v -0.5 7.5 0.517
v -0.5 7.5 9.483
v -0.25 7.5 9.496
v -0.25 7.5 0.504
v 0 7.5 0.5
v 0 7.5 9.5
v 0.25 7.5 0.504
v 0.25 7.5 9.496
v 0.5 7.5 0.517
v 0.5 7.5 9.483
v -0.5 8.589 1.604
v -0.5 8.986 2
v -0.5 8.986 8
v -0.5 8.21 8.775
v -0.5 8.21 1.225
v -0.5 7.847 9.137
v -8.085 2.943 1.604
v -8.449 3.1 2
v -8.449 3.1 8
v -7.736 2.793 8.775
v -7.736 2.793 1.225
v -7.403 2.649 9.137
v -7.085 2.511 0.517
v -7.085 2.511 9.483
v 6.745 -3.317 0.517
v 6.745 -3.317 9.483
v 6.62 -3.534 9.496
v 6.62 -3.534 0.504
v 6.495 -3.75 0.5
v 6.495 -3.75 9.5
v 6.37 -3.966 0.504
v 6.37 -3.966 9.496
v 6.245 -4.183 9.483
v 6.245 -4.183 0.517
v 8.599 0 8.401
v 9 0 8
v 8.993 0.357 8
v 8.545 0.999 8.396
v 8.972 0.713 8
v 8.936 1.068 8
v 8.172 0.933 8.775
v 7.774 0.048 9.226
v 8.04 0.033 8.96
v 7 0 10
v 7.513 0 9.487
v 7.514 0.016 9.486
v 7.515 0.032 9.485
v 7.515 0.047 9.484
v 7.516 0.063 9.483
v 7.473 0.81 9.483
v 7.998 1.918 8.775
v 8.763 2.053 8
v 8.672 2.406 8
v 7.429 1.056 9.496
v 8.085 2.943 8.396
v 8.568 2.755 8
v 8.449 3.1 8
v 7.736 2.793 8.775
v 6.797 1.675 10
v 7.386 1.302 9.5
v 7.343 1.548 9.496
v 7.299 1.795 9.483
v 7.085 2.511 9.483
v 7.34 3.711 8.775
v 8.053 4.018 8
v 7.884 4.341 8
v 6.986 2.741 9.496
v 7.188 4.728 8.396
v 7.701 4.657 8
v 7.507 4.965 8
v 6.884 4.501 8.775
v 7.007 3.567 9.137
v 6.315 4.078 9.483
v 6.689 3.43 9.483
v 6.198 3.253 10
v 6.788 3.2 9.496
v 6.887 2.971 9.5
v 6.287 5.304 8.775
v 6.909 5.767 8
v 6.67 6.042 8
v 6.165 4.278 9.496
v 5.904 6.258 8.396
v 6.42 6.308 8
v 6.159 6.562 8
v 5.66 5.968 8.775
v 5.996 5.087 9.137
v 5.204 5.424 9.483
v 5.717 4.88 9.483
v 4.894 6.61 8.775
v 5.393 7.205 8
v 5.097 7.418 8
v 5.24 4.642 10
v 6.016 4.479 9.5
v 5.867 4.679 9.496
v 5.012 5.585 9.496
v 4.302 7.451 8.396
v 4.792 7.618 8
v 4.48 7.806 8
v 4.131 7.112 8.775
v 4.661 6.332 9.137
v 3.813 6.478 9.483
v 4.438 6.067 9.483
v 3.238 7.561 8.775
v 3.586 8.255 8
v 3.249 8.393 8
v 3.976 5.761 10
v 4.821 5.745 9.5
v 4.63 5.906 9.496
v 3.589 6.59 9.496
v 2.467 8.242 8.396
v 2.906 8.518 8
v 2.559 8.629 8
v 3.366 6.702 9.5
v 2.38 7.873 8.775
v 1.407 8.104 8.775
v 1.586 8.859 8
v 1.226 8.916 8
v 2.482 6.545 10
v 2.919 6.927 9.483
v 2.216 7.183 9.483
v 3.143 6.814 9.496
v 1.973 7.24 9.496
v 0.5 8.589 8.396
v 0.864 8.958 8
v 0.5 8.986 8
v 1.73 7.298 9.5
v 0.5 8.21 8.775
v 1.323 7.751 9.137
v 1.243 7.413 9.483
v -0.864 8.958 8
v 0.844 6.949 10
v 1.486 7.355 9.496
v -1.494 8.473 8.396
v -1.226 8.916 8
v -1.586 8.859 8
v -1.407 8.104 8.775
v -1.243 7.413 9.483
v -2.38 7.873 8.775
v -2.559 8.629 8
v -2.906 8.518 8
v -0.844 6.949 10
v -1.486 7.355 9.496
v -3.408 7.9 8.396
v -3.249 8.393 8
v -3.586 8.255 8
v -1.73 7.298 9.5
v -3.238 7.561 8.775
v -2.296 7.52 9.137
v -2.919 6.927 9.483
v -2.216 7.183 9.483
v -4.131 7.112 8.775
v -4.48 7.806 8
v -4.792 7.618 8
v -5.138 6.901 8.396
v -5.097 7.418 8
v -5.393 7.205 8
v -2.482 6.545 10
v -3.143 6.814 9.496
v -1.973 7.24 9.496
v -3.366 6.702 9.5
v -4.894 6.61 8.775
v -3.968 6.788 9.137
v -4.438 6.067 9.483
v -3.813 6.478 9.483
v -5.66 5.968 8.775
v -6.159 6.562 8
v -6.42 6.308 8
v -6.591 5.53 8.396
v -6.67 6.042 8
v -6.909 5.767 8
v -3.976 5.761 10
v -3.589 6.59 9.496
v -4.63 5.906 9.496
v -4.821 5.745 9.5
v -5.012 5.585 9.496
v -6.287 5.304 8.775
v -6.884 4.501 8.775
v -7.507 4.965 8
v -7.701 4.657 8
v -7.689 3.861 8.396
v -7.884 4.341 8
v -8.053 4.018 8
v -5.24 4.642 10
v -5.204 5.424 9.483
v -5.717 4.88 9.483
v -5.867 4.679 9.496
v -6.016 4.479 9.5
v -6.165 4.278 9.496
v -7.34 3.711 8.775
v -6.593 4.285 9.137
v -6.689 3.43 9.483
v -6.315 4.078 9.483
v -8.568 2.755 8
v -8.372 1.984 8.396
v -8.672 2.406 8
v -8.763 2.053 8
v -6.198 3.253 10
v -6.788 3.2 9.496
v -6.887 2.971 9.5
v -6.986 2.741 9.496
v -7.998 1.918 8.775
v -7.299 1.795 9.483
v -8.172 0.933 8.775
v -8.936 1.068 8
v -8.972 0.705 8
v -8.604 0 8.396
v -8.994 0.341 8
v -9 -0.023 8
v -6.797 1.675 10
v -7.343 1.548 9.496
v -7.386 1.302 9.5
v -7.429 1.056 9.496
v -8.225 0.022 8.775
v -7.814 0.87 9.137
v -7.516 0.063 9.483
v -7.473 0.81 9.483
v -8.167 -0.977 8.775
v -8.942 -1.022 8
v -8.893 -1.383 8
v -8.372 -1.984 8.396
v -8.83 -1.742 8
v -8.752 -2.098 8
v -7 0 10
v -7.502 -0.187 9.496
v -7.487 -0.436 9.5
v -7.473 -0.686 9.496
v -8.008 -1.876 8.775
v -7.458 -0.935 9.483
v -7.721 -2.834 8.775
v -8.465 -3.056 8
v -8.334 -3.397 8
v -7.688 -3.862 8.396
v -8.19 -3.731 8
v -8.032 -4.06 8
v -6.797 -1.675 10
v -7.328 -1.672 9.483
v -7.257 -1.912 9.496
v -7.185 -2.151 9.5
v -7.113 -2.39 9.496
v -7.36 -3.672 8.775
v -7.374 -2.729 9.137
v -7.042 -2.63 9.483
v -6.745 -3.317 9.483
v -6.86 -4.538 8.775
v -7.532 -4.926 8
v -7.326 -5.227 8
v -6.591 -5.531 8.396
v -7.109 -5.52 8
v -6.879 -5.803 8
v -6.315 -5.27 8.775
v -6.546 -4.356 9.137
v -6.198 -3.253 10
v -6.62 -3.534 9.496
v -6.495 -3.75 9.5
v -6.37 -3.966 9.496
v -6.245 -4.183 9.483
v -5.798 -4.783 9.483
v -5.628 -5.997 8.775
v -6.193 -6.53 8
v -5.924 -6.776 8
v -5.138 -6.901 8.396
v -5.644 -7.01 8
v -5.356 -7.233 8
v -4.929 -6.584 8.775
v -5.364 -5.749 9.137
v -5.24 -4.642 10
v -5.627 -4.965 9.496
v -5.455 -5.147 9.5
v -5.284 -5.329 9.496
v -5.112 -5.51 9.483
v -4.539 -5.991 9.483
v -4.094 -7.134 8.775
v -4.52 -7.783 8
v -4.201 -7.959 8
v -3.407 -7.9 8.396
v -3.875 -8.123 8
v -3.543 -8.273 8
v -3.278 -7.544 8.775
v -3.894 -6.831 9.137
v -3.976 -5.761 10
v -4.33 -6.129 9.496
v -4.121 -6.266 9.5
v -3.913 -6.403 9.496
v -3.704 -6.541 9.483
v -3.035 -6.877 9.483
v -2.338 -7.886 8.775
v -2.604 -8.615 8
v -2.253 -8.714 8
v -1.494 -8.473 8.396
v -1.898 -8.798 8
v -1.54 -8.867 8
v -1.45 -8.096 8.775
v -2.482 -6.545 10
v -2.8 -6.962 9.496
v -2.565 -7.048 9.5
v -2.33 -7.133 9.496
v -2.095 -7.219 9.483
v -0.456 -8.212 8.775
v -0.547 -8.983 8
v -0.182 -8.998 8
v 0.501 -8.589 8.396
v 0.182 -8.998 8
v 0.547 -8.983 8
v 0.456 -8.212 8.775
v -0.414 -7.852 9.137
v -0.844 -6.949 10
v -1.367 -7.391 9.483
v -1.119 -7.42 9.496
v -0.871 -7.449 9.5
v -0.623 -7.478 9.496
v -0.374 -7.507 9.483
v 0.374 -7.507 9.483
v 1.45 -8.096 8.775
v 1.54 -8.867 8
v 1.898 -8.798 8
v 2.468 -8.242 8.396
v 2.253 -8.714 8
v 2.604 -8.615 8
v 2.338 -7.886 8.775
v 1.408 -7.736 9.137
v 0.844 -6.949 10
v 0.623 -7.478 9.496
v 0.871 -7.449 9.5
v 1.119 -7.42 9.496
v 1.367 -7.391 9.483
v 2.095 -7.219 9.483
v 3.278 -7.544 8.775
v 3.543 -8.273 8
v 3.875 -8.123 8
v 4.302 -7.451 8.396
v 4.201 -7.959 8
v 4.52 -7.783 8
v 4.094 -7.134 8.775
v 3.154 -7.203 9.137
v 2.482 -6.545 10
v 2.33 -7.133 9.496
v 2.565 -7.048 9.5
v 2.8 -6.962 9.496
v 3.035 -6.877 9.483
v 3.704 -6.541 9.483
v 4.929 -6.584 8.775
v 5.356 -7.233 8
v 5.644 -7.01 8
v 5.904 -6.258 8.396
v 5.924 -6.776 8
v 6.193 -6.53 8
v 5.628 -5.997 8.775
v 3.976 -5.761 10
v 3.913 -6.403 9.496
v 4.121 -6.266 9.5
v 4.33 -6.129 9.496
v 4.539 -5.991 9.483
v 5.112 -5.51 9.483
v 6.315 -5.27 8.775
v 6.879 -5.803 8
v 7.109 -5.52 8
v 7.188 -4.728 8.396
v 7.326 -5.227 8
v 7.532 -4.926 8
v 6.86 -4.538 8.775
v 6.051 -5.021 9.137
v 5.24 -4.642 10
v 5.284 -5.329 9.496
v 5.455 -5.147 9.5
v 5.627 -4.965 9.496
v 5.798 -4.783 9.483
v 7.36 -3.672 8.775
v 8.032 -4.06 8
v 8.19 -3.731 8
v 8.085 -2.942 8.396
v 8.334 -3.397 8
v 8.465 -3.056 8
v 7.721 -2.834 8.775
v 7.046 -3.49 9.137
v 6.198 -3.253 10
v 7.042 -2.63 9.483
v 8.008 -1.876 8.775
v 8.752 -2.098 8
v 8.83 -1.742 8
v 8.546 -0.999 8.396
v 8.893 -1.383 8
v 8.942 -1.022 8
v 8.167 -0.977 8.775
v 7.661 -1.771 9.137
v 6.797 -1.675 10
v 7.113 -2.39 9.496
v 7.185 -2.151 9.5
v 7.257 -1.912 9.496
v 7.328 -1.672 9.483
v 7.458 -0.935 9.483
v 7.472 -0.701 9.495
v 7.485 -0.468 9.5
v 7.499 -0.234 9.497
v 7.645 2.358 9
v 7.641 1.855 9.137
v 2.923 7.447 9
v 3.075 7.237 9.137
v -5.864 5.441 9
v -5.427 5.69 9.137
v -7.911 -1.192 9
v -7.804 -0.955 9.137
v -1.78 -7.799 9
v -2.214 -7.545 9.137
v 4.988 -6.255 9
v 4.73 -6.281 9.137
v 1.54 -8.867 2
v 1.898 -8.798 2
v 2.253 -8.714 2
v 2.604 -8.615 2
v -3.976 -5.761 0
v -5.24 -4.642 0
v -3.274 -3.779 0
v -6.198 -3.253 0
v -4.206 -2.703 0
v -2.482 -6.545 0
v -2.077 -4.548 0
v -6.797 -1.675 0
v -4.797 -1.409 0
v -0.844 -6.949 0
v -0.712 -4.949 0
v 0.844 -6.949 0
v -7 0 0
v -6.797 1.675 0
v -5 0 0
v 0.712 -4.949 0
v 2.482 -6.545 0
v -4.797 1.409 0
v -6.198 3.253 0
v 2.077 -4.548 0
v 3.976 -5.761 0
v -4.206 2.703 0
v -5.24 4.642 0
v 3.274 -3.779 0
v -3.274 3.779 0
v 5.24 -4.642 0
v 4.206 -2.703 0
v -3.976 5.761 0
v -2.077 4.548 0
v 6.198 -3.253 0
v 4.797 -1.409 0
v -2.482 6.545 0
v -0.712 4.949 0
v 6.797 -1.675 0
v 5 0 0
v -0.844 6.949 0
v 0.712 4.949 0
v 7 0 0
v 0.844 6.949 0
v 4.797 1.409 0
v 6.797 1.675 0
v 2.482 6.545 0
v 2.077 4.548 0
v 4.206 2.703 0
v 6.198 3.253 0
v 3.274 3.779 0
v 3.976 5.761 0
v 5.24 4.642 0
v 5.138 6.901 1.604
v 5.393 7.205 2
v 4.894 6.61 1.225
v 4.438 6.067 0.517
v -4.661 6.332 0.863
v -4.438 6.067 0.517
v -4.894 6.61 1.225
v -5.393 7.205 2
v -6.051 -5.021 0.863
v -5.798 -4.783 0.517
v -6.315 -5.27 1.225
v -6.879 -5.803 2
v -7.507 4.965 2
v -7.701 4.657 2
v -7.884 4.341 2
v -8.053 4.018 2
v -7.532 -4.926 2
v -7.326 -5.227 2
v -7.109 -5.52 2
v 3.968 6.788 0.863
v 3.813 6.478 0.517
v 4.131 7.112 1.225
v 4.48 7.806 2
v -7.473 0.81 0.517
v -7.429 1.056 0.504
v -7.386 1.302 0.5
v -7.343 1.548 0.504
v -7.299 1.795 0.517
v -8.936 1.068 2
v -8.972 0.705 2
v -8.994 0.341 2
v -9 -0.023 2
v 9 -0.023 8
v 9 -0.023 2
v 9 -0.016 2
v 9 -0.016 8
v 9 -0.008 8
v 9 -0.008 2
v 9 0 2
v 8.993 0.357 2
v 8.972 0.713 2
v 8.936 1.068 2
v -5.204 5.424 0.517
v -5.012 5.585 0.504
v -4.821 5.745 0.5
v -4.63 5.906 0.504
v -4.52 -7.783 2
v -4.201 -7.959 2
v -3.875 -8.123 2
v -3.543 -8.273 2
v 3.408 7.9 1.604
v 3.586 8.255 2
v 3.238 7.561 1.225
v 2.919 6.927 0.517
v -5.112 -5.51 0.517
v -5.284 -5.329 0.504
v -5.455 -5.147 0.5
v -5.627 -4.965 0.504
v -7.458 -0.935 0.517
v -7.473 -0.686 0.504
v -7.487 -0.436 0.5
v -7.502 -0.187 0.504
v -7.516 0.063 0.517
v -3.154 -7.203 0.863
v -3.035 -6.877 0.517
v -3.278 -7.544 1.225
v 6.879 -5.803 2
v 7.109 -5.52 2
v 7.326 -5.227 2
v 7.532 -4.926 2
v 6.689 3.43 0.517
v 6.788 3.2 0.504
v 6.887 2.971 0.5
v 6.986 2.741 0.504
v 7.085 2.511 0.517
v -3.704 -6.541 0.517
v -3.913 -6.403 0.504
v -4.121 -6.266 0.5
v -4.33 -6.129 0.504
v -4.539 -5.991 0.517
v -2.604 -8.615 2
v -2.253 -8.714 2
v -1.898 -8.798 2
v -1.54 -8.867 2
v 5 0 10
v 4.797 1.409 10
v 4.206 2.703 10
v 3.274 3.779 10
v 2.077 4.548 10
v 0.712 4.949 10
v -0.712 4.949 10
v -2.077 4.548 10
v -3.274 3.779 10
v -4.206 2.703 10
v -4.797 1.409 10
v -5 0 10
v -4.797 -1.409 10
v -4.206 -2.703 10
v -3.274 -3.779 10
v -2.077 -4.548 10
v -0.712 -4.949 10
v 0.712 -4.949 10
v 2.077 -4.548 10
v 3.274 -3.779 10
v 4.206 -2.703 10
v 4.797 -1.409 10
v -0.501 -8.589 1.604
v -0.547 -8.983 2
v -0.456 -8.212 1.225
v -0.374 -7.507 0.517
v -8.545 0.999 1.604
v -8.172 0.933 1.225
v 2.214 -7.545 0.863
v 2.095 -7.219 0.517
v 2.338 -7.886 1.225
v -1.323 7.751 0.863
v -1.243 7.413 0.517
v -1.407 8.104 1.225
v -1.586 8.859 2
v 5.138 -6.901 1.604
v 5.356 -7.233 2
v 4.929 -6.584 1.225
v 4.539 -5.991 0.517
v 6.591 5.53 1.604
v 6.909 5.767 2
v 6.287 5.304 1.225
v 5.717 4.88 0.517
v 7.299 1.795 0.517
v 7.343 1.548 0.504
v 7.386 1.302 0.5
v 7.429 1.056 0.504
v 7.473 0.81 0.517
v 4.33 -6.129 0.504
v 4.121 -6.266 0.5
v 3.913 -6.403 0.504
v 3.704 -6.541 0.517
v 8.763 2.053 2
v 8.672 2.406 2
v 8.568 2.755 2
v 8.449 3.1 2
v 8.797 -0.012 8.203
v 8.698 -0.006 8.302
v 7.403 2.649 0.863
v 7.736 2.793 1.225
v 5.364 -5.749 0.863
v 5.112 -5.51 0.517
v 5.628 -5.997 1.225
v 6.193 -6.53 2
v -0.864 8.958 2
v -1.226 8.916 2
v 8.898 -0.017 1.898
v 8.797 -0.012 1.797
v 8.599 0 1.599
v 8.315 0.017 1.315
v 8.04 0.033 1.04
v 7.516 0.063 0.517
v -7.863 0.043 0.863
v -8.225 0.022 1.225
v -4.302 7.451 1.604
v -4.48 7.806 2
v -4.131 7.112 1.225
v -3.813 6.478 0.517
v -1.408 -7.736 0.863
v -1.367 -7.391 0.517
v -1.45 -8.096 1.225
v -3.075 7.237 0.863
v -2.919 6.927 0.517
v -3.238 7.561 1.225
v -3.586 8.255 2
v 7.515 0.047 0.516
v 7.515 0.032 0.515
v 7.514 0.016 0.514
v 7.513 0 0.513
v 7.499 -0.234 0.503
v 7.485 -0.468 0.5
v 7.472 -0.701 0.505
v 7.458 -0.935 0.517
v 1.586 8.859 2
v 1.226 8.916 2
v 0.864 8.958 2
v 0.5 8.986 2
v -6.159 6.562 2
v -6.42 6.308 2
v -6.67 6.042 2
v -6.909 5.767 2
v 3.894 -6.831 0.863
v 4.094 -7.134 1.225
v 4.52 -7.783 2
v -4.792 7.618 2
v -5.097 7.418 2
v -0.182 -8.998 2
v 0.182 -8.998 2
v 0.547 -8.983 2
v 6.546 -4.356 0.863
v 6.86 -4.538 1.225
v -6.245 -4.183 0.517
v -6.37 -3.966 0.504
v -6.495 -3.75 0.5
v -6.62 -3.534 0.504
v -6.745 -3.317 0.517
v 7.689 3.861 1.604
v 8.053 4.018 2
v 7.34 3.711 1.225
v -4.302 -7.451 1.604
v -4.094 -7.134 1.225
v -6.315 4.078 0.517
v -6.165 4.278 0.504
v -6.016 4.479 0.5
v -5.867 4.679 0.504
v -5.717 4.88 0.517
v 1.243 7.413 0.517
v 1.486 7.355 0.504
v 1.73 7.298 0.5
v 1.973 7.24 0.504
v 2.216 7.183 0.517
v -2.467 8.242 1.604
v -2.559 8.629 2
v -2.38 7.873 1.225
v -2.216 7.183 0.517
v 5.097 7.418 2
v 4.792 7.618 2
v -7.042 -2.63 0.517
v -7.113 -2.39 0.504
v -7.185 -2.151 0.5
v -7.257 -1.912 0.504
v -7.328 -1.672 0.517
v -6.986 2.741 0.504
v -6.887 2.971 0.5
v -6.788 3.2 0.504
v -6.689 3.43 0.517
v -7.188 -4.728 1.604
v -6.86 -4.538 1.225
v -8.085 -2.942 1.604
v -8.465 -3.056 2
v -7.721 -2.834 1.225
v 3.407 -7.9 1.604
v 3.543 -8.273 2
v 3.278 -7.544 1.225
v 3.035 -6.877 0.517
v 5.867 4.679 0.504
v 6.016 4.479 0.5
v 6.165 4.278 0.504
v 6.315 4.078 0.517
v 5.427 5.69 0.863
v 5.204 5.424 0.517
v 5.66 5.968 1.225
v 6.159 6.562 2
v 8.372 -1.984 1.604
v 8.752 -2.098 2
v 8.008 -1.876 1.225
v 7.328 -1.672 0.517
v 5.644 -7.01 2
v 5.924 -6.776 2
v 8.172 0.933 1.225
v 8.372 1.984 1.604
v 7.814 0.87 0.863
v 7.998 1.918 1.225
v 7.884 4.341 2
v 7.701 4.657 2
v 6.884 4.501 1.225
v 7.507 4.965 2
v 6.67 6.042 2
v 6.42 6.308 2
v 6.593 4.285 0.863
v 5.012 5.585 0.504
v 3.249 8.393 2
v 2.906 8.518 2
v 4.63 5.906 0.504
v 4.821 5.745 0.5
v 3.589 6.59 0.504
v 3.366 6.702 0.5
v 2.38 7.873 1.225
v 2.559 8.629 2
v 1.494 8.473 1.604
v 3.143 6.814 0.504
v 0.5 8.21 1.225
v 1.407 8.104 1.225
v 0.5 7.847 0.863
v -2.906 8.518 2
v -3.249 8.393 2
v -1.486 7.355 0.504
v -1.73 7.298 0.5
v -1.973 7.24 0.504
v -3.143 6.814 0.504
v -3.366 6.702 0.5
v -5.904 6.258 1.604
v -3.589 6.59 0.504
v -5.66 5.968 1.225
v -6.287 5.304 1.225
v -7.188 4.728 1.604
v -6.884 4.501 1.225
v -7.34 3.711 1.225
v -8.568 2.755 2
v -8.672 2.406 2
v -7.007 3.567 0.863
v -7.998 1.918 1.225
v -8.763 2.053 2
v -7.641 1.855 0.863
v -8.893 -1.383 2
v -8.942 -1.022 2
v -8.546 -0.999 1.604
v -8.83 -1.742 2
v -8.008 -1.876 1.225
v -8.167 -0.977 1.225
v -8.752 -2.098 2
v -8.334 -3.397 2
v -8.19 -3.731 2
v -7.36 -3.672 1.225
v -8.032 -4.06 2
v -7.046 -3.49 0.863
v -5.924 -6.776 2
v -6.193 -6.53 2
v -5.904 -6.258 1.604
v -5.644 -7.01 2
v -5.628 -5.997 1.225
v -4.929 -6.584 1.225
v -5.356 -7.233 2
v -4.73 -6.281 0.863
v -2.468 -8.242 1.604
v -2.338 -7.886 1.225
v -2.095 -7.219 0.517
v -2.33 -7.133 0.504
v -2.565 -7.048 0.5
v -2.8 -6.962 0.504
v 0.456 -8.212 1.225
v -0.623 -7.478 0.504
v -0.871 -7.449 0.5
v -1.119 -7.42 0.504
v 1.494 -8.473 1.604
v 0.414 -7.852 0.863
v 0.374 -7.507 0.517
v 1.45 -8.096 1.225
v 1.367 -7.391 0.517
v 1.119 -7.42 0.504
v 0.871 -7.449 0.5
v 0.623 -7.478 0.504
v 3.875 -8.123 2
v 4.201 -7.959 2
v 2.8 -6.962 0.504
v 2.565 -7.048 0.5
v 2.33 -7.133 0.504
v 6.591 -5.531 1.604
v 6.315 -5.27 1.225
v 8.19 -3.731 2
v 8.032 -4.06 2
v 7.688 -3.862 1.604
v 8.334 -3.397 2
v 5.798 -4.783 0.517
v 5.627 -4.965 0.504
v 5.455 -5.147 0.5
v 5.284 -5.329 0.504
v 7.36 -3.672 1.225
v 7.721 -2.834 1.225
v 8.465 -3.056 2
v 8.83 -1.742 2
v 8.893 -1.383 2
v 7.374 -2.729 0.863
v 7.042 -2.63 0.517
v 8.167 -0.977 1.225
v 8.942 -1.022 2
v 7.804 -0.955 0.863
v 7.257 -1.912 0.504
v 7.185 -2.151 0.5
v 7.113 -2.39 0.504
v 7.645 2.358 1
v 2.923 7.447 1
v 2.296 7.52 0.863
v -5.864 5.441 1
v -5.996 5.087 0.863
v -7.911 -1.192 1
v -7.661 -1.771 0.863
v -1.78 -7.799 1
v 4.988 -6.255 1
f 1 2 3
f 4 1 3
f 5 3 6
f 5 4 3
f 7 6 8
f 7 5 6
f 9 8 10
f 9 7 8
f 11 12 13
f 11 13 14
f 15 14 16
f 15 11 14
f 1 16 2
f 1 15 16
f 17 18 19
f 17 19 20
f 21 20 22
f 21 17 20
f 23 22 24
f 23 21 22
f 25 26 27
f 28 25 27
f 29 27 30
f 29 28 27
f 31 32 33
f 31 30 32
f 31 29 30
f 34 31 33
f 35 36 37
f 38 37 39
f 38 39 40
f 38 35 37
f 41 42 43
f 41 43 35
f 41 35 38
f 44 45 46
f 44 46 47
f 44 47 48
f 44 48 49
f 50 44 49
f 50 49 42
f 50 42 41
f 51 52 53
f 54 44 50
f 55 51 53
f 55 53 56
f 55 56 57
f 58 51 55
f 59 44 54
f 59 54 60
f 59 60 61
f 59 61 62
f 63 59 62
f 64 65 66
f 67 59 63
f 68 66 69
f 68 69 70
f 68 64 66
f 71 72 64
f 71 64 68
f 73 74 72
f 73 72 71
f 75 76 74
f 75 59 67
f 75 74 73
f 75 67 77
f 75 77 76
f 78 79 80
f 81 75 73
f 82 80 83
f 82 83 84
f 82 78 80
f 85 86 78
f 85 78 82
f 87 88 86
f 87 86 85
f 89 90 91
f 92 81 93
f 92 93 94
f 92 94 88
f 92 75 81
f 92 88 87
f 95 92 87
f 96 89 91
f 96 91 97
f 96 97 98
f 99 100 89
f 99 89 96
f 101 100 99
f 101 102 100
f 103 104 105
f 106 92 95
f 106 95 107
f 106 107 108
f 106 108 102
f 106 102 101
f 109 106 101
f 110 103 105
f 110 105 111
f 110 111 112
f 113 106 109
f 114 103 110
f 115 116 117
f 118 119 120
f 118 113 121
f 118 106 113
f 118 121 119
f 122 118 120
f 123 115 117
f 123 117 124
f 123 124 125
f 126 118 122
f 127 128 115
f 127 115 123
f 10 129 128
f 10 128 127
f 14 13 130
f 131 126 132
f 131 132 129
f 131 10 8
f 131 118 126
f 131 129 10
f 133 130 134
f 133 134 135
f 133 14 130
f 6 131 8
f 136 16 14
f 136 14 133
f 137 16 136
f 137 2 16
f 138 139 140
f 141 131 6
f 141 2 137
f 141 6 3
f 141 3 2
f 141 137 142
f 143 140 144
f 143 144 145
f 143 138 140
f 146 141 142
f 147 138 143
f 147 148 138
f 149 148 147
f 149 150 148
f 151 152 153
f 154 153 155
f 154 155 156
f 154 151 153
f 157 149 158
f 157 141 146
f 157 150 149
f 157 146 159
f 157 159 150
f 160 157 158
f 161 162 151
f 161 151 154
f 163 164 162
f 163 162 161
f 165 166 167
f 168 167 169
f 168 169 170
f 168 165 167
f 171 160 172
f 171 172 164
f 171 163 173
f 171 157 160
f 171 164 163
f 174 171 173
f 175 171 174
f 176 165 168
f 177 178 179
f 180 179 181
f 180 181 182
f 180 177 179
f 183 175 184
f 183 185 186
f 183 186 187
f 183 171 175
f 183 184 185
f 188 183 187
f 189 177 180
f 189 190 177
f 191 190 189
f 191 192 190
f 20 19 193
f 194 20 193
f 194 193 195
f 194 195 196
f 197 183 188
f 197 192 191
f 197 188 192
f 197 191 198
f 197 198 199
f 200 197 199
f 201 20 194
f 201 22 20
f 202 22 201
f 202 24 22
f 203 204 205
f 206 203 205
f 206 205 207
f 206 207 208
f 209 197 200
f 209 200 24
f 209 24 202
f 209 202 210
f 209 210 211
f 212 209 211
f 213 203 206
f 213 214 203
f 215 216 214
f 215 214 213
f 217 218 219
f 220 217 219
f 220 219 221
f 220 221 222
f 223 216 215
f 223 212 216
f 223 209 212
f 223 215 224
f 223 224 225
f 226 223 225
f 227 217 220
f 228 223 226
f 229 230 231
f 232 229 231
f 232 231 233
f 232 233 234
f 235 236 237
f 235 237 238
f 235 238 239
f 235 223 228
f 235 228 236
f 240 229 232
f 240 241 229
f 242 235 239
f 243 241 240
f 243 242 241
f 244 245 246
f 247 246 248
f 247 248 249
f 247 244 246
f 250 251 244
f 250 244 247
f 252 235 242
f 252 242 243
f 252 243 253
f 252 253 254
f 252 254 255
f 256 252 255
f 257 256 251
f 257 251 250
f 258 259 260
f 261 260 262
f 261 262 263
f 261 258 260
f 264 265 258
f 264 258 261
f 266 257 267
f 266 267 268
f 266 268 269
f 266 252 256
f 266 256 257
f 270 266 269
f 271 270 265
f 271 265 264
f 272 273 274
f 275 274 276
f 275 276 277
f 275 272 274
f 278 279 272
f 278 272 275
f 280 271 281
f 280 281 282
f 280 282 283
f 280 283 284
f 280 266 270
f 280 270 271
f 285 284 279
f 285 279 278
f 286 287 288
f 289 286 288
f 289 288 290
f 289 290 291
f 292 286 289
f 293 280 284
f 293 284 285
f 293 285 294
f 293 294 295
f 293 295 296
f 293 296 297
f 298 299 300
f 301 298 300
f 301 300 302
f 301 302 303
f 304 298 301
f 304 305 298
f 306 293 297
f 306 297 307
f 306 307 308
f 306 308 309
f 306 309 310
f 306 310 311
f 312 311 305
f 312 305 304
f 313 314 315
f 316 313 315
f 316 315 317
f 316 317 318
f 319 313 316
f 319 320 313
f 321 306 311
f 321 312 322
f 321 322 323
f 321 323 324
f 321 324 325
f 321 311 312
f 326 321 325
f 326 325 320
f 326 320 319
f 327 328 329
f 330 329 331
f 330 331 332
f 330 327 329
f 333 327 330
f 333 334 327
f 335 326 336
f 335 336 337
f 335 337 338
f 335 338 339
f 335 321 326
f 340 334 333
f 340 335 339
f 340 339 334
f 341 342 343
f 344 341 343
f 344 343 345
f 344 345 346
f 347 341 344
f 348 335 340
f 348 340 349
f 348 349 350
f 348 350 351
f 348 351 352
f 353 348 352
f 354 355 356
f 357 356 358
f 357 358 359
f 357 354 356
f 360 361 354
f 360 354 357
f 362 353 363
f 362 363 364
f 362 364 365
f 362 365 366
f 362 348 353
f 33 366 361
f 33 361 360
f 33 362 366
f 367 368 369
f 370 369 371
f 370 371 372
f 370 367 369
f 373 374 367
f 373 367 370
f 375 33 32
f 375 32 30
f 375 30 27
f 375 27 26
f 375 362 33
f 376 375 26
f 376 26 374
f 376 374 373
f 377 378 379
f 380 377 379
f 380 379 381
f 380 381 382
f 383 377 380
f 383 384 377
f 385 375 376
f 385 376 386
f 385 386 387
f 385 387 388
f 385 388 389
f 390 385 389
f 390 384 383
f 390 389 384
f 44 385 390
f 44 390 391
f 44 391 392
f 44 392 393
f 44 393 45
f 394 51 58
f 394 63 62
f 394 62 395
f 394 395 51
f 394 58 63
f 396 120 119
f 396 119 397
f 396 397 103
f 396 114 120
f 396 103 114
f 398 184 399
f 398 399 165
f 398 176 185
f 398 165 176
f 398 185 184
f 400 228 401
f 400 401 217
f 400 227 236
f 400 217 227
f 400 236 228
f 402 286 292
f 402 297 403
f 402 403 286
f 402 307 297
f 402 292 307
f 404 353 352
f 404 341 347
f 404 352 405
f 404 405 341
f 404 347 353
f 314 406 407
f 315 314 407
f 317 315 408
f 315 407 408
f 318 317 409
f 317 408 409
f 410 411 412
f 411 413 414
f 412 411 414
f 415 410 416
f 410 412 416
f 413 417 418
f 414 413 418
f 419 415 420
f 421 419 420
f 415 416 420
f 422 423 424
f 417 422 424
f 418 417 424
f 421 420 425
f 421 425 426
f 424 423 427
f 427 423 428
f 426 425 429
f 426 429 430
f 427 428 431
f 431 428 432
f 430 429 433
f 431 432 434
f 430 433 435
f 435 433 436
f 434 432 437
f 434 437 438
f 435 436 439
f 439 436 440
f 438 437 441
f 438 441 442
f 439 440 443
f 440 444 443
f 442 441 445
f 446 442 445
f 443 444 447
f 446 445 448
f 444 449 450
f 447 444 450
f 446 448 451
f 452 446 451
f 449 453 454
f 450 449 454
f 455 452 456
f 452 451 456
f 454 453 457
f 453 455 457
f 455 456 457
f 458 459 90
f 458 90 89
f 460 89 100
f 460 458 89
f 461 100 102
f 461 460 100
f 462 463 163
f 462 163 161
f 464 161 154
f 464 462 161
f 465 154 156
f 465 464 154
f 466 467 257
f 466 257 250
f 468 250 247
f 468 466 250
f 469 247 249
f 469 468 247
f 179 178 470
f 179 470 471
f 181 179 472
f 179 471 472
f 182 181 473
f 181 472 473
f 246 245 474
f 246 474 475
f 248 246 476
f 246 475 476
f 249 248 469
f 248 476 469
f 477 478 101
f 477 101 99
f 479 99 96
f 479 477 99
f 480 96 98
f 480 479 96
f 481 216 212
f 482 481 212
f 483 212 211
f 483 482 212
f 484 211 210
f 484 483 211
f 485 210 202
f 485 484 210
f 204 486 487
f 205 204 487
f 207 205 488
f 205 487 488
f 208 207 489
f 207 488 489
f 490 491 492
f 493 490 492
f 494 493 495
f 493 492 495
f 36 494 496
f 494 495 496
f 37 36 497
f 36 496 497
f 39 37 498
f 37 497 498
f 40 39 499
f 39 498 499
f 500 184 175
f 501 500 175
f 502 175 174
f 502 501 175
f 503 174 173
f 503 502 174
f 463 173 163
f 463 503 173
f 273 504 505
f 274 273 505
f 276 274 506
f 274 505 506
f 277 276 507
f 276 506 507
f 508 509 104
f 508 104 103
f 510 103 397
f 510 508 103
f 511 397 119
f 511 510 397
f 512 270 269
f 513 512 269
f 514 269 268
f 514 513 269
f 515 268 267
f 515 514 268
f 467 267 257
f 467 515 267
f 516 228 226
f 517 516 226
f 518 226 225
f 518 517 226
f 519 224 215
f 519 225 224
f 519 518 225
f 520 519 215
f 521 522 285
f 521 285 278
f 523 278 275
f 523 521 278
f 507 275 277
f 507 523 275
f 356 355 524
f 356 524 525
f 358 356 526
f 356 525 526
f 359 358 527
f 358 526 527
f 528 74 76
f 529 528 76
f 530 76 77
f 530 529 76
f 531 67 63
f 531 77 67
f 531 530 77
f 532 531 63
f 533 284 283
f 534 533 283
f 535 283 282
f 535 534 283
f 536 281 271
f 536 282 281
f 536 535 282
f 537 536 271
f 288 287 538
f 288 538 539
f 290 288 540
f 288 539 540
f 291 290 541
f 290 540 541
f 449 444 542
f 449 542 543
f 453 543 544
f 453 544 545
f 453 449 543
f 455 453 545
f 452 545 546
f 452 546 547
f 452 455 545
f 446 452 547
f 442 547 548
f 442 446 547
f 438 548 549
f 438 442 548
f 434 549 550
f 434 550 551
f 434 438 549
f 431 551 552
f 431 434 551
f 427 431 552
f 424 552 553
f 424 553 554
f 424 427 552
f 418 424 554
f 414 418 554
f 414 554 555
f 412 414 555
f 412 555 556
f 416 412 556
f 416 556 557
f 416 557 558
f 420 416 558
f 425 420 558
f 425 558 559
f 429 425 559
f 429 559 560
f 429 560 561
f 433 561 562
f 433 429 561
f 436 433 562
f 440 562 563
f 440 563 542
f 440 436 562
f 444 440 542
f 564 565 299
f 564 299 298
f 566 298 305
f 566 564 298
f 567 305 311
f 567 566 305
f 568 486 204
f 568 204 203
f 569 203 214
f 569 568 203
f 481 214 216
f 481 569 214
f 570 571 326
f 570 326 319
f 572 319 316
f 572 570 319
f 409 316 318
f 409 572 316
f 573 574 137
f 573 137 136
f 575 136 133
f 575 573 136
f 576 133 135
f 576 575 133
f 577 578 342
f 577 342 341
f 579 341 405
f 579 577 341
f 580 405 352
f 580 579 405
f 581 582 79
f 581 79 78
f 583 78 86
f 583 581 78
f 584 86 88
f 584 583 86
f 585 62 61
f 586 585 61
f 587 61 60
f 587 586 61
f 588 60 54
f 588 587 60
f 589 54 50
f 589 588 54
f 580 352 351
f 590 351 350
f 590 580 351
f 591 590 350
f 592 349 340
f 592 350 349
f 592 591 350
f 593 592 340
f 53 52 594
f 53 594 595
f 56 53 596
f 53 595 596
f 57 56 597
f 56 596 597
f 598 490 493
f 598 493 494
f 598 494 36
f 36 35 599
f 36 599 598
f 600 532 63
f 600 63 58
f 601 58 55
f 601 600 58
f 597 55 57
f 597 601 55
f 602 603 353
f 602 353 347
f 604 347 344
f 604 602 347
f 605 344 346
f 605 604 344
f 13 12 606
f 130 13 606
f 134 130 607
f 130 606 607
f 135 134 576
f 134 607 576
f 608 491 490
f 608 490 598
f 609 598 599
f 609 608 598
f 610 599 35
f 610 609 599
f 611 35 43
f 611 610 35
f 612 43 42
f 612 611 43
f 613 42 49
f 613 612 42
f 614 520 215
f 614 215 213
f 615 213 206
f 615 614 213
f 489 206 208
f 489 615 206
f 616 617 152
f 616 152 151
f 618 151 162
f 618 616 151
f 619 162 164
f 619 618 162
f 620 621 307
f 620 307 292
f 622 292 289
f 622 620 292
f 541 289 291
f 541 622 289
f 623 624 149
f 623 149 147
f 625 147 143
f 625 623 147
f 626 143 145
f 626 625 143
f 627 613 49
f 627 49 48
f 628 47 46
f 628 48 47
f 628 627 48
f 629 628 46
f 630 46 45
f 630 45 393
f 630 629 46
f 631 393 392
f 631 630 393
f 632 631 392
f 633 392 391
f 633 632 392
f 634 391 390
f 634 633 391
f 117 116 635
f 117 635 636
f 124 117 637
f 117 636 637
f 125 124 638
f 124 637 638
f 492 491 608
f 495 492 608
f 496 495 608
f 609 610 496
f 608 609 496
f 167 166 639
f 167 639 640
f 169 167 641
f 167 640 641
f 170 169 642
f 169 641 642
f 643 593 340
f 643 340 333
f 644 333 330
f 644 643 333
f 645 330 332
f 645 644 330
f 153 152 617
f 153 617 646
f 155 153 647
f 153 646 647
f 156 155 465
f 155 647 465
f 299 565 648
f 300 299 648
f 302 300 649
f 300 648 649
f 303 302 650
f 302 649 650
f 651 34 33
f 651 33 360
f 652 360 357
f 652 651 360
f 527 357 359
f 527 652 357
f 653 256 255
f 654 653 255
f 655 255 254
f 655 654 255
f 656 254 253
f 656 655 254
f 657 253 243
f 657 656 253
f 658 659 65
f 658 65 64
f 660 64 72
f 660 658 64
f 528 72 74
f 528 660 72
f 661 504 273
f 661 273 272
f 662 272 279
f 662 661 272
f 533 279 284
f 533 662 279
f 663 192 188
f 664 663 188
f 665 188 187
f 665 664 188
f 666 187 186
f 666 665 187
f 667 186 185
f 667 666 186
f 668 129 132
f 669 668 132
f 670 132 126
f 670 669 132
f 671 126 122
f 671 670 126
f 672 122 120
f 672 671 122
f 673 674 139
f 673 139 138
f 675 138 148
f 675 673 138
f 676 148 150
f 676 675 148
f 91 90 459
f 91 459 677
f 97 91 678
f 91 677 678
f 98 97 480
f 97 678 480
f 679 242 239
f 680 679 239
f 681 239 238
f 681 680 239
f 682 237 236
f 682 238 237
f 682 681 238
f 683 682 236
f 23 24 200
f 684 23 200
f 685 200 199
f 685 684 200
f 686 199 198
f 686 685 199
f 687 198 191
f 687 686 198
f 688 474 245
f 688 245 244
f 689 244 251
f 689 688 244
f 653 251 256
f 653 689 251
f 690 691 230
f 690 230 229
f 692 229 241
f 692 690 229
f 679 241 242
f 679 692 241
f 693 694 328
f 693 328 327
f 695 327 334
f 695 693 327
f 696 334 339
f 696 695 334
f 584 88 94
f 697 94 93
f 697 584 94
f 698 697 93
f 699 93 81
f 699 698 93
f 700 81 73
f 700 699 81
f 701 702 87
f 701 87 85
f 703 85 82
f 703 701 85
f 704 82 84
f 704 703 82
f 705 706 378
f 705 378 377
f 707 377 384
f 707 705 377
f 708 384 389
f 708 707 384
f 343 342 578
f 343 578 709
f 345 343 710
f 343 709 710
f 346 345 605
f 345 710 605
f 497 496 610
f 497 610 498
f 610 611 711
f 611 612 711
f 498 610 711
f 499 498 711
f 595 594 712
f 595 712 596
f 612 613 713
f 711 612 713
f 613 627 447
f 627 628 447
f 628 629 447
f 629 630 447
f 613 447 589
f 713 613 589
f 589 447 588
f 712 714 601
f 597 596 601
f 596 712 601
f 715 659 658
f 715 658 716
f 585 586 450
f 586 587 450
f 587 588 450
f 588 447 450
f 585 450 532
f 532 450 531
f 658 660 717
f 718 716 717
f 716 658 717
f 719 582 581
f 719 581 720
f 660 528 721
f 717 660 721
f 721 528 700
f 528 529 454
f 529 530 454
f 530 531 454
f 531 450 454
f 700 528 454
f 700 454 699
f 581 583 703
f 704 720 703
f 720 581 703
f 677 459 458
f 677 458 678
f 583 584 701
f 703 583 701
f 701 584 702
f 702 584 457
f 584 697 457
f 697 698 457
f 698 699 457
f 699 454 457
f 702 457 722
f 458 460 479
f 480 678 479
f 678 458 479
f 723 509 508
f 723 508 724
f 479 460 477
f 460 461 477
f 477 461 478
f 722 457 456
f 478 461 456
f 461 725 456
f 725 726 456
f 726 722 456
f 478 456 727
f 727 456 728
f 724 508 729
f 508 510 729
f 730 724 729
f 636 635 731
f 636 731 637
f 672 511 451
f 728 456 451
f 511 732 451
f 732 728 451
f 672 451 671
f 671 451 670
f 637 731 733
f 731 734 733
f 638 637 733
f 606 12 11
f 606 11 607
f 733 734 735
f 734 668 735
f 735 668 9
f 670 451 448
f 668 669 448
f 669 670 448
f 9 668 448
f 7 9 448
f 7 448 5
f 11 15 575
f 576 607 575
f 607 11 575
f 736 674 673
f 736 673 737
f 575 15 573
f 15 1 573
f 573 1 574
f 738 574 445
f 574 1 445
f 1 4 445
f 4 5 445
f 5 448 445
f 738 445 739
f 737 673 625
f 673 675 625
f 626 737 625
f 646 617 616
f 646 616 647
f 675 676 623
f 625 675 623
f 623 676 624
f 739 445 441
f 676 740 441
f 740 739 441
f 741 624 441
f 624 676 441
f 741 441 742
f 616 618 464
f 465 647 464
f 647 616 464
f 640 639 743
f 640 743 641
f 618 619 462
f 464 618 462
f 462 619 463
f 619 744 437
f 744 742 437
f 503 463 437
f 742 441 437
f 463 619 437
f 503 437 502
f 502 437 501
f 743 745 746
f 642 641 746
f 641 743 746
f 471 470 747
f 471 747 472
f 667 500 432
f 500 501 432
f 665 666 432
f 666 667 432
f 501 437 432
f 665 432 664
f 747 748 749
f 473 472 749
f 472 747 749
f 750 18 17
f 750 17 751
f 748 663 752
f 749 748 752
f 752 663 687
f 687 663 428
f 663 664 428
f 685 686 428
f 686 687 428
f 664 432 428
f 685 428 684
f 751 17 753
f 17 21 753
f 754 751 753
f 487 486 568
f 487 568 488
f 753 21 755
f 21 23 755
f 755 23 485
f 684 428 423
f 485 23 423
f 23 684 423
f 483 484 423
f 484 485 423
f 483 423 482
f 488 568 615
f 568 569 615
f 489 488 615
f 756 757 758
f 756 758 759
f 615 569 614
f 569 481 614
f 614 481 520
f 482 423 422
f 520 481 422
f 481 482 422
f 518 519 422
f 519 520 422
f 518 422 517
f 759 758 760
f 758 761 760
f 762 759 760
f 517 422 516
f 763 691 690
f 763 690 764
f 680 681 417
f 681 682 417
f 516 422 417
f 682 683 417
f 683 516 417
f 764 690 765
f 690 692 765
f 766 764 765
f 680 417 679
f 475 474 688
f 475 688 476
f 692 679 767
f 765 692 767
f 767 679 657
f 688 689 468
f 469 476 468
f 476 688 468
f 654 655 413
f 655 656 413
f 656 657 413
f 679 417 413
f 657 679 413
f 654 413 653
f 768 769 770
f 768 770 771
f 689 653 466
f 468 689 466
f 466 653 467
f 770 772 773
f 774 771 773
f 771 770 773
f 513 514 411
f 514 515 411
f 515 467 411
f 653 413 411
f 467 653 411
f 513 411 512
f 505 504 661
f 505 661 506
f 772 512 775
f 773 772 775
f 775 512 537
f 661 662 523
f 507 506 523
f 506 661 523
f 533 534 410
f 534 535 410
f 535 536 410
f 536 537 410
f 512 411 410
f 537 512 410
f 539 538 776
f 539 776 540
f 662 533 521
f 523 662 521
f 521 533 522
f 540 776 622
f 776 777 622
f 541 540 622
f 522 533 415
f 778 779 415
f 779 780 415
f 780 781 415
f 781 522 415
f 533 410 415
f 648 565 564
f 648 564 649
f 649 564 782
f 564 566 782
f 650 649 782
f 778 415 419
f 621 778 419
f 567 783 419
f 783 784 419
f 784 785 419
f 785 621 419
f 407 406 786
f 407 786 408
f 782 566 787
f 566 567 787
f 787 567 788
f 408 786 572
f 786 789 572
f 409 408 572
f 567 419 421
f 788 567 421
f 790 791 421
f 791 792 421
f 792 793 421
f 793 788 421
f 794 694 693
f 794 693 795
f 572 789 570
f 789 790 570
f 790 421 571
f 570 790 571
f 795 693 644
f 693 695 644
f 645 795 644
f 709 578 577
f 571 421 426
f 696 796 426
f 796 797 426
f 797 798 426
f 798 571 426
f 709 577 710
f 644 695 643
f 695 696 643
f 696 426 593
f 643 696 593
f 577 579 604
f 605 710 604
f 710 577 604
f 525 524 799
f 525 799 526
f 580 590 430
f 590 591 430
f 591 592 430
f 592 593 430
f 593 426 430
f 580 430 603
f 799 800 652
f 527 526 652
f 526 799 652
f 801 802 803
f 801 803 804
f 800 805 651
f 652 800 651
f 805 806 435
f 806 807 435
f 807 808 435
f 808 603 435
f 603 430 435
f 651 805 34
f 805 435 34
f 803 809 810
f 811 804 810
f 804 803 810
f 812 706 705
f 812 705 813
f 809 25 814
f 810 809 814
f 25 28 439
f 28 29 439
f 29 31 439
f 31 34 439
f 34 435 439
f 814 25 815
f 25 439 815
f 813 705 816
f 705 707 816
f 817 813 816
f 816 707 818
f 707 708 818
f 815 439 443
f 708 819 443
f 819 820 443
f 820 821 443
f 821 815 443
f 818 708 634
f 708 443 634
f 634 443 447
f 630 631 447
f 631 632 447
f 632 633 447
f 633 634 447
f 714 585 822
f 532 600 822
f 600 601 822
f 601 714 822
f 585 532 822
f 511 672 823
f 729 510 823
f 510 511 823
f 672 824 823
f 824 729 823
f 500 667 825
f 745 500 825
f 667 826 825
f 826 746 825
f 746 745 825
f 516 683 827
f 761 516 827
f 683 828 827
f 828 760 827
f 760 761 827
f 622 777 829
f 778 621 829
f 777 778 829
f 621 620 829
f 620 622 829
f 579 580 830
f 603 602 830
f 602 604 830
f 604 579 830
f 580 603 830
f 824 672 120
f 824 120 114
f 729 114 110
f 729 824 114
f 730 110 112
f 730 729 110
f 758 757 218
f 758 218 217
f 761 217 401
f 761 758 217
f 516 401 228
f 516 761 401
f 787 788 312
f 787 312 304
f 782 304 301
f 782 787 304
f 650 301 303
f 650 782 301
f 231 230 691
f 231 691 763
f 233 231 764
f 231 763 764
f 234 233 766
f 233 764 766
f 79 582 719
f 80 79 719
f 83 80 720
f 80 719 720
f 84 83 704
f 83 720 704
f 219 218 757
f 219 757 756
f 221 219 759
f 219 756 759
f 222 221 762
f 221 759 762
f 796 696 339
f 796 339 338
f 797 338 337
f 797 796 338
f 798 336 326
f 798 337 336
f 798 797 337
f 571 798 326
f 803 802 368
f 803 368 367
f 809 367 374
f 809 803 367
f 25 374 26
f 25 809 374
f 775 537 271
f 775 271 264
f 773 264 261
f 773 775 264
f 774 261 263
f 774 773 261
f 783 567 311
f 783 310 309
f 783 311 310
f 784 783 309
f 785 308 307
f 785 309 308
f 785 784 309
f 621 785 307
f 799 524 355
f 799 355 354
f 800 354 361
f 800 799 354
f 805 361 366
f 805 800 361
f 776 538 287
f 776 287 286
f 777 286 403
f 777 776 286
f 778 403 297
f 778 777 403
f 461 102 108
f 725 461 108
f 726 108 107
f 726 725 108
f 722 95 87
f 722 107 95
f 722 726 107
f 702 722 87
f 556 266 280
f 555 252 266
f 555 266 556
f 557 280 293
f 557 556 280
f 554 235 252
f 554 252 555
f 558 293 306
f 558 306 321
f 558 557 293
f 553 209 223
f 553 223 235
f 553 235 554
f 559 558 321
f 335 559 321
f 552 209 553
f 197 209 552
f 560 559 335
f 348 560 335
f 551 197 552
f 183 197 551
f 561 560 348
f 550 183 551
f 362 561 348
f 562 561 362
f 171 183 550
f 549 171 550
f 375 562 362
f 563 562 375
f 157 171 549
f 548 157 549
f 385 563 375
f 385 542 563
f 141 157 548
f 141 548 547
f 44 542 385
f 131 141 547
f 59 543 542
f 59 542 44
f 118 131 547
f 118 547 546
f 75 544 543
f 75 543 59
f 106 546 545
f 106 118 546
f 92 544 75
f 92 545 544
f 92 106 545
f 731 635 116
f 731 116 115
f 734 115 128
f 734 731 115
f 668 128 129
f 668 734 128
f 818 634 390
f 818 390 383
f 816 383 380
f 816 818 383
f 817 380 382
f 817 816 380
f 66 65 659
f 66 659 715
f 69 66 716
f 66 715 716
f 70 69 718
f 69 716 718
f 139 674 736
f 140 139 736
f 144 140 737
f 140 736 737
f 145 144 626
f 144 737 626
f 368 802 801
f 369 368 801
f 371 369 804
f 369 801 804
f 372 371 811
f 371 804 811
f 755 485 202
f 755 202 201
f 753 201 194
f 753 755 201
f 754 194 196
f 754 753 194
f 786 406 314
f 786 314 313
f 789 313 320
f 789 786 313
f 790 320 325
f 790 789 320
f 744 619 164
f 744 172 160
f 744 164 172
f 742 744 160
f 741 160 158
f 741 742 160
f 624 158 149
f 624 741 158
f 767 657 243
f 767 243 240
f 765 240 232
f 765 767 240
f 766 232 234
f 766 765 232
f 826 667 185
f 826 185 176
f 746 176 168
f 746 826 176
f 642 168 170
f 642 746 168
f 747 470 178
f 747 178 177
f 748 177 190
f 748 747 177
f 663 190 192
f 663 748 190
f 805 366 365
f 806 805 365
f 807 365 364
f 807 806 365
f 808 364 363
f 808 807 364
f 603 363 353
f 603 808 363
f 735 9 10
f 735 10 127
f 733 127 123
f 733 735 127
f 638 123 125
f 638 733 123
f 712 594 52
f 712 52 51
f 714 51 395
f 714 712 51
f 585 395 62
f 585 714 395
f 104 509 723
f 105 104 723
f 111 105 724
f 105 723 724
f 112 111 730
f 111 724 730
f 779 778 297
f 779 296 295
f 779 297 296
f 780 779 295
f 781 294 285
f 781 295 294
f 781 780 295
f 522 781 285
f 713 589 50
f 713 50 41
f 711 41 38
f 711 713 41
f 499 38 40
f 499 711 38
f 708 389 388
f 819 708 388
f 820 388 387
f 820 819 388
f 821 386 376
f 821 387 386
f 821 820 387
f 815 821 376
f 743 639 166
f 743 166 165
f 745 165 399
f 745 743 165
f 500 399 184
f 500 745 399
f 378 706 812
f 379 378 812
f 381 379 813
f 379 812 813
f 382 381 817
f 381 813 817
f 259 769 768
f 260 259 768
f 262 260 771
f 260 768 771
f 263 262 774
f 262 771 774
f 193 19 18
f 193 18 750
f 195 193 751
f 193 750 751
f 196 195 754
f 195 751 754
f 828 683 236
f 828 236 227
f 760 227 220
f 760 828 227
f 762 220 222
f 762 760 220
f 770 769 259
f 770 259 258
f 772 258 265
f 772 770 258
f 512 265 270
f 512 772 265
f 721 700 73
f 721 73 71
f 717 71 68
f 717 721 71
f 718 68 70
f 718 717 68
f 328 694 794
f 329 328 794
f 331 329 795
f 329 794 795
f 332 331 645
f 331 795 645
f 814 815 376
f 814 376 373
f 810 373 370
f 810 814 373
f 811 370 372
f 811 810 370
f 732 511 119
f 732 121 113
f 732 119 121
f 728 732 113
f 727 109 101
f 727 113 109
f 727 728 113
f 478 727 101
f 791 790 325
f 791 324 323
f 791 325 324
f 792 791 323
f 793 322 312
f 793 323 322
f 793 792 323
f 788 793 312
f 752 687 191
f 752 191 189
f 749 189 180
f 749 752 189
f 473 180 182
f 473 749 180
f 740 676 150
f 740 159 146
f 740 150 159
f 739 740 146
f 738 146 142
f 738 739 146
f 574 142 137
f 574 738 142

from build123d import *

# Parameters (mm, degrees)
SKETCH1_R           = 9
SKETCH1_R_2         = 5
BOSS_EXTRUDE1_DEPTH = 10
CHAMFER1_SIZE       = 2
CUT_EXTRUDE1_DEPTH  = 11
CIRPATTERN1_COUNT   = 27


with BuildPart() as part:
    # Sketch1 → Boss-Extrude1 (new body)
    with BuildSketch(Plane.XY):
        Circle(SKETCH1_R)
        Circle(SKETCH1_R_2, mode=Mode.SUBTRACT)
    extrude(amount=BOSS_EXTRUDE1_DEPTH)

    # Chamfer1
    chamfer1_edges = [part.edges().sort_by_distance(p)[0] for p in [
        (-9, 0, 10),
        (-9, 0, 0),
    ]]
    chamfer(chamfer1_edges, length=CHAMFER1_SIZE)

    # Sketch2 → Cut-Extrude1 (cut, through all)
    with BuildSketch(Plane.XY):
        with BuildLine():
            Line((-0.5, 7.5), (0.5, 7.5))
            Line((0.5, 7.5), (0.5, 8.986100378))
            ThreePointArc((0.5, 8.986100378), (0, 9), (-0.5, 8.986100378))
            Line((-0.5, 8.986100378), (-0.5, 7.5))
        make_face()
    cut_extrude1 = extrude(amount=CUT_EXTRUDE1_DEPTH, mode=Mode.SUBTRACT)

    # CirPattern1: Cut-Extrude1 ×27 about axis
    cirpattern1_axis = Axis((0, 0, 0), (0, 0, 1))
    for i in range(1, CIRPATTERN1_COUNT):
        add(cut_extrude1.rotate(cirpattern1_axis, i * 360 / CIRPATTERN1_COUNT), mode=Mode.SUBTRACT)


solid = part.part
